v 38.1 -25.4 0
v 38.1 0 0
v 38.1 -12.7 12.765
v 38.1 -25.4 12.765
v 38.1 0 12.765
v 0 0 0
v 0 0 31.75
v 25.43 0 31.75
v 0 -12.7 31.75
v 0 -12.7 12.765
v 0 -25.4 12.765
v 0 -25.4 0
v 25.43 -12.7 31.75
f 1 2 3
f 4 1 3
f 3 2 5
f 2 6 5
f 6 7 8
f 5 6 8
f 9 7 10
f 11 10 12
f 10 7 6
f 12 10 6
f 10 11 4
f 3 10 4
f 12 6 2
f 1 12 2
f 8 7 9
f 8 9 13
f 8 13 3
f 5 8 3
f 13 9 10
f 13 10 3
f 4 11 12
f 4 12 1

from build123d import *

# Parameters (mm, degrees)
F2_DEPTH = 25.4
F0_W     = 38.1
F0_H     = 31.75
F3_DEPTH = 25.4
F4_W     = 38.1
F4_H     = 18.9845859185
F5_DEPTH = 12.7
F7_DEPTH = 12.701


with BuildPart() as f2:
    # F1 (on Front) → F2 (new body)
    with BuildSketch(Plane.XZ):
        Polygon((33.8248718529, 28.3878277987), (0, 28.3878277987), (0, 0), (34.039542079, 0), align=None)
    extrude(amount=F2_DEPTH)

    # F0 (on Front) → F3 (join)
    with BuildSketch(Plane.XZ):
        with Locations((19.05, 15.875)):
            Rectangle(F0_W, F0_H)
    extrude(amount=F3_DEPTH)

    # F4 (on face) → F5 (cut)
    with BuildSketch(Plane.XZ.offset(25.4)):
        with Locations((19.05, 22.2577070408)):
            Rectangle(F4_W, F4_H)
    extrude(amount=-F5_DEPTH, mode=Mode.SUBTRACT)

    # F6 (on face) → F7 (cut, through all)
    with BuildSketch(Plane.XZ.offset(12.7)):
        Polygon((38.1, 31.75), (25.4303161055, 31.75), (38.1, 12.7654140815), align=None)
    extrude(amount=-F7_DEPTH, mode=Mode.SUBTRACT)


solid = f2.part
